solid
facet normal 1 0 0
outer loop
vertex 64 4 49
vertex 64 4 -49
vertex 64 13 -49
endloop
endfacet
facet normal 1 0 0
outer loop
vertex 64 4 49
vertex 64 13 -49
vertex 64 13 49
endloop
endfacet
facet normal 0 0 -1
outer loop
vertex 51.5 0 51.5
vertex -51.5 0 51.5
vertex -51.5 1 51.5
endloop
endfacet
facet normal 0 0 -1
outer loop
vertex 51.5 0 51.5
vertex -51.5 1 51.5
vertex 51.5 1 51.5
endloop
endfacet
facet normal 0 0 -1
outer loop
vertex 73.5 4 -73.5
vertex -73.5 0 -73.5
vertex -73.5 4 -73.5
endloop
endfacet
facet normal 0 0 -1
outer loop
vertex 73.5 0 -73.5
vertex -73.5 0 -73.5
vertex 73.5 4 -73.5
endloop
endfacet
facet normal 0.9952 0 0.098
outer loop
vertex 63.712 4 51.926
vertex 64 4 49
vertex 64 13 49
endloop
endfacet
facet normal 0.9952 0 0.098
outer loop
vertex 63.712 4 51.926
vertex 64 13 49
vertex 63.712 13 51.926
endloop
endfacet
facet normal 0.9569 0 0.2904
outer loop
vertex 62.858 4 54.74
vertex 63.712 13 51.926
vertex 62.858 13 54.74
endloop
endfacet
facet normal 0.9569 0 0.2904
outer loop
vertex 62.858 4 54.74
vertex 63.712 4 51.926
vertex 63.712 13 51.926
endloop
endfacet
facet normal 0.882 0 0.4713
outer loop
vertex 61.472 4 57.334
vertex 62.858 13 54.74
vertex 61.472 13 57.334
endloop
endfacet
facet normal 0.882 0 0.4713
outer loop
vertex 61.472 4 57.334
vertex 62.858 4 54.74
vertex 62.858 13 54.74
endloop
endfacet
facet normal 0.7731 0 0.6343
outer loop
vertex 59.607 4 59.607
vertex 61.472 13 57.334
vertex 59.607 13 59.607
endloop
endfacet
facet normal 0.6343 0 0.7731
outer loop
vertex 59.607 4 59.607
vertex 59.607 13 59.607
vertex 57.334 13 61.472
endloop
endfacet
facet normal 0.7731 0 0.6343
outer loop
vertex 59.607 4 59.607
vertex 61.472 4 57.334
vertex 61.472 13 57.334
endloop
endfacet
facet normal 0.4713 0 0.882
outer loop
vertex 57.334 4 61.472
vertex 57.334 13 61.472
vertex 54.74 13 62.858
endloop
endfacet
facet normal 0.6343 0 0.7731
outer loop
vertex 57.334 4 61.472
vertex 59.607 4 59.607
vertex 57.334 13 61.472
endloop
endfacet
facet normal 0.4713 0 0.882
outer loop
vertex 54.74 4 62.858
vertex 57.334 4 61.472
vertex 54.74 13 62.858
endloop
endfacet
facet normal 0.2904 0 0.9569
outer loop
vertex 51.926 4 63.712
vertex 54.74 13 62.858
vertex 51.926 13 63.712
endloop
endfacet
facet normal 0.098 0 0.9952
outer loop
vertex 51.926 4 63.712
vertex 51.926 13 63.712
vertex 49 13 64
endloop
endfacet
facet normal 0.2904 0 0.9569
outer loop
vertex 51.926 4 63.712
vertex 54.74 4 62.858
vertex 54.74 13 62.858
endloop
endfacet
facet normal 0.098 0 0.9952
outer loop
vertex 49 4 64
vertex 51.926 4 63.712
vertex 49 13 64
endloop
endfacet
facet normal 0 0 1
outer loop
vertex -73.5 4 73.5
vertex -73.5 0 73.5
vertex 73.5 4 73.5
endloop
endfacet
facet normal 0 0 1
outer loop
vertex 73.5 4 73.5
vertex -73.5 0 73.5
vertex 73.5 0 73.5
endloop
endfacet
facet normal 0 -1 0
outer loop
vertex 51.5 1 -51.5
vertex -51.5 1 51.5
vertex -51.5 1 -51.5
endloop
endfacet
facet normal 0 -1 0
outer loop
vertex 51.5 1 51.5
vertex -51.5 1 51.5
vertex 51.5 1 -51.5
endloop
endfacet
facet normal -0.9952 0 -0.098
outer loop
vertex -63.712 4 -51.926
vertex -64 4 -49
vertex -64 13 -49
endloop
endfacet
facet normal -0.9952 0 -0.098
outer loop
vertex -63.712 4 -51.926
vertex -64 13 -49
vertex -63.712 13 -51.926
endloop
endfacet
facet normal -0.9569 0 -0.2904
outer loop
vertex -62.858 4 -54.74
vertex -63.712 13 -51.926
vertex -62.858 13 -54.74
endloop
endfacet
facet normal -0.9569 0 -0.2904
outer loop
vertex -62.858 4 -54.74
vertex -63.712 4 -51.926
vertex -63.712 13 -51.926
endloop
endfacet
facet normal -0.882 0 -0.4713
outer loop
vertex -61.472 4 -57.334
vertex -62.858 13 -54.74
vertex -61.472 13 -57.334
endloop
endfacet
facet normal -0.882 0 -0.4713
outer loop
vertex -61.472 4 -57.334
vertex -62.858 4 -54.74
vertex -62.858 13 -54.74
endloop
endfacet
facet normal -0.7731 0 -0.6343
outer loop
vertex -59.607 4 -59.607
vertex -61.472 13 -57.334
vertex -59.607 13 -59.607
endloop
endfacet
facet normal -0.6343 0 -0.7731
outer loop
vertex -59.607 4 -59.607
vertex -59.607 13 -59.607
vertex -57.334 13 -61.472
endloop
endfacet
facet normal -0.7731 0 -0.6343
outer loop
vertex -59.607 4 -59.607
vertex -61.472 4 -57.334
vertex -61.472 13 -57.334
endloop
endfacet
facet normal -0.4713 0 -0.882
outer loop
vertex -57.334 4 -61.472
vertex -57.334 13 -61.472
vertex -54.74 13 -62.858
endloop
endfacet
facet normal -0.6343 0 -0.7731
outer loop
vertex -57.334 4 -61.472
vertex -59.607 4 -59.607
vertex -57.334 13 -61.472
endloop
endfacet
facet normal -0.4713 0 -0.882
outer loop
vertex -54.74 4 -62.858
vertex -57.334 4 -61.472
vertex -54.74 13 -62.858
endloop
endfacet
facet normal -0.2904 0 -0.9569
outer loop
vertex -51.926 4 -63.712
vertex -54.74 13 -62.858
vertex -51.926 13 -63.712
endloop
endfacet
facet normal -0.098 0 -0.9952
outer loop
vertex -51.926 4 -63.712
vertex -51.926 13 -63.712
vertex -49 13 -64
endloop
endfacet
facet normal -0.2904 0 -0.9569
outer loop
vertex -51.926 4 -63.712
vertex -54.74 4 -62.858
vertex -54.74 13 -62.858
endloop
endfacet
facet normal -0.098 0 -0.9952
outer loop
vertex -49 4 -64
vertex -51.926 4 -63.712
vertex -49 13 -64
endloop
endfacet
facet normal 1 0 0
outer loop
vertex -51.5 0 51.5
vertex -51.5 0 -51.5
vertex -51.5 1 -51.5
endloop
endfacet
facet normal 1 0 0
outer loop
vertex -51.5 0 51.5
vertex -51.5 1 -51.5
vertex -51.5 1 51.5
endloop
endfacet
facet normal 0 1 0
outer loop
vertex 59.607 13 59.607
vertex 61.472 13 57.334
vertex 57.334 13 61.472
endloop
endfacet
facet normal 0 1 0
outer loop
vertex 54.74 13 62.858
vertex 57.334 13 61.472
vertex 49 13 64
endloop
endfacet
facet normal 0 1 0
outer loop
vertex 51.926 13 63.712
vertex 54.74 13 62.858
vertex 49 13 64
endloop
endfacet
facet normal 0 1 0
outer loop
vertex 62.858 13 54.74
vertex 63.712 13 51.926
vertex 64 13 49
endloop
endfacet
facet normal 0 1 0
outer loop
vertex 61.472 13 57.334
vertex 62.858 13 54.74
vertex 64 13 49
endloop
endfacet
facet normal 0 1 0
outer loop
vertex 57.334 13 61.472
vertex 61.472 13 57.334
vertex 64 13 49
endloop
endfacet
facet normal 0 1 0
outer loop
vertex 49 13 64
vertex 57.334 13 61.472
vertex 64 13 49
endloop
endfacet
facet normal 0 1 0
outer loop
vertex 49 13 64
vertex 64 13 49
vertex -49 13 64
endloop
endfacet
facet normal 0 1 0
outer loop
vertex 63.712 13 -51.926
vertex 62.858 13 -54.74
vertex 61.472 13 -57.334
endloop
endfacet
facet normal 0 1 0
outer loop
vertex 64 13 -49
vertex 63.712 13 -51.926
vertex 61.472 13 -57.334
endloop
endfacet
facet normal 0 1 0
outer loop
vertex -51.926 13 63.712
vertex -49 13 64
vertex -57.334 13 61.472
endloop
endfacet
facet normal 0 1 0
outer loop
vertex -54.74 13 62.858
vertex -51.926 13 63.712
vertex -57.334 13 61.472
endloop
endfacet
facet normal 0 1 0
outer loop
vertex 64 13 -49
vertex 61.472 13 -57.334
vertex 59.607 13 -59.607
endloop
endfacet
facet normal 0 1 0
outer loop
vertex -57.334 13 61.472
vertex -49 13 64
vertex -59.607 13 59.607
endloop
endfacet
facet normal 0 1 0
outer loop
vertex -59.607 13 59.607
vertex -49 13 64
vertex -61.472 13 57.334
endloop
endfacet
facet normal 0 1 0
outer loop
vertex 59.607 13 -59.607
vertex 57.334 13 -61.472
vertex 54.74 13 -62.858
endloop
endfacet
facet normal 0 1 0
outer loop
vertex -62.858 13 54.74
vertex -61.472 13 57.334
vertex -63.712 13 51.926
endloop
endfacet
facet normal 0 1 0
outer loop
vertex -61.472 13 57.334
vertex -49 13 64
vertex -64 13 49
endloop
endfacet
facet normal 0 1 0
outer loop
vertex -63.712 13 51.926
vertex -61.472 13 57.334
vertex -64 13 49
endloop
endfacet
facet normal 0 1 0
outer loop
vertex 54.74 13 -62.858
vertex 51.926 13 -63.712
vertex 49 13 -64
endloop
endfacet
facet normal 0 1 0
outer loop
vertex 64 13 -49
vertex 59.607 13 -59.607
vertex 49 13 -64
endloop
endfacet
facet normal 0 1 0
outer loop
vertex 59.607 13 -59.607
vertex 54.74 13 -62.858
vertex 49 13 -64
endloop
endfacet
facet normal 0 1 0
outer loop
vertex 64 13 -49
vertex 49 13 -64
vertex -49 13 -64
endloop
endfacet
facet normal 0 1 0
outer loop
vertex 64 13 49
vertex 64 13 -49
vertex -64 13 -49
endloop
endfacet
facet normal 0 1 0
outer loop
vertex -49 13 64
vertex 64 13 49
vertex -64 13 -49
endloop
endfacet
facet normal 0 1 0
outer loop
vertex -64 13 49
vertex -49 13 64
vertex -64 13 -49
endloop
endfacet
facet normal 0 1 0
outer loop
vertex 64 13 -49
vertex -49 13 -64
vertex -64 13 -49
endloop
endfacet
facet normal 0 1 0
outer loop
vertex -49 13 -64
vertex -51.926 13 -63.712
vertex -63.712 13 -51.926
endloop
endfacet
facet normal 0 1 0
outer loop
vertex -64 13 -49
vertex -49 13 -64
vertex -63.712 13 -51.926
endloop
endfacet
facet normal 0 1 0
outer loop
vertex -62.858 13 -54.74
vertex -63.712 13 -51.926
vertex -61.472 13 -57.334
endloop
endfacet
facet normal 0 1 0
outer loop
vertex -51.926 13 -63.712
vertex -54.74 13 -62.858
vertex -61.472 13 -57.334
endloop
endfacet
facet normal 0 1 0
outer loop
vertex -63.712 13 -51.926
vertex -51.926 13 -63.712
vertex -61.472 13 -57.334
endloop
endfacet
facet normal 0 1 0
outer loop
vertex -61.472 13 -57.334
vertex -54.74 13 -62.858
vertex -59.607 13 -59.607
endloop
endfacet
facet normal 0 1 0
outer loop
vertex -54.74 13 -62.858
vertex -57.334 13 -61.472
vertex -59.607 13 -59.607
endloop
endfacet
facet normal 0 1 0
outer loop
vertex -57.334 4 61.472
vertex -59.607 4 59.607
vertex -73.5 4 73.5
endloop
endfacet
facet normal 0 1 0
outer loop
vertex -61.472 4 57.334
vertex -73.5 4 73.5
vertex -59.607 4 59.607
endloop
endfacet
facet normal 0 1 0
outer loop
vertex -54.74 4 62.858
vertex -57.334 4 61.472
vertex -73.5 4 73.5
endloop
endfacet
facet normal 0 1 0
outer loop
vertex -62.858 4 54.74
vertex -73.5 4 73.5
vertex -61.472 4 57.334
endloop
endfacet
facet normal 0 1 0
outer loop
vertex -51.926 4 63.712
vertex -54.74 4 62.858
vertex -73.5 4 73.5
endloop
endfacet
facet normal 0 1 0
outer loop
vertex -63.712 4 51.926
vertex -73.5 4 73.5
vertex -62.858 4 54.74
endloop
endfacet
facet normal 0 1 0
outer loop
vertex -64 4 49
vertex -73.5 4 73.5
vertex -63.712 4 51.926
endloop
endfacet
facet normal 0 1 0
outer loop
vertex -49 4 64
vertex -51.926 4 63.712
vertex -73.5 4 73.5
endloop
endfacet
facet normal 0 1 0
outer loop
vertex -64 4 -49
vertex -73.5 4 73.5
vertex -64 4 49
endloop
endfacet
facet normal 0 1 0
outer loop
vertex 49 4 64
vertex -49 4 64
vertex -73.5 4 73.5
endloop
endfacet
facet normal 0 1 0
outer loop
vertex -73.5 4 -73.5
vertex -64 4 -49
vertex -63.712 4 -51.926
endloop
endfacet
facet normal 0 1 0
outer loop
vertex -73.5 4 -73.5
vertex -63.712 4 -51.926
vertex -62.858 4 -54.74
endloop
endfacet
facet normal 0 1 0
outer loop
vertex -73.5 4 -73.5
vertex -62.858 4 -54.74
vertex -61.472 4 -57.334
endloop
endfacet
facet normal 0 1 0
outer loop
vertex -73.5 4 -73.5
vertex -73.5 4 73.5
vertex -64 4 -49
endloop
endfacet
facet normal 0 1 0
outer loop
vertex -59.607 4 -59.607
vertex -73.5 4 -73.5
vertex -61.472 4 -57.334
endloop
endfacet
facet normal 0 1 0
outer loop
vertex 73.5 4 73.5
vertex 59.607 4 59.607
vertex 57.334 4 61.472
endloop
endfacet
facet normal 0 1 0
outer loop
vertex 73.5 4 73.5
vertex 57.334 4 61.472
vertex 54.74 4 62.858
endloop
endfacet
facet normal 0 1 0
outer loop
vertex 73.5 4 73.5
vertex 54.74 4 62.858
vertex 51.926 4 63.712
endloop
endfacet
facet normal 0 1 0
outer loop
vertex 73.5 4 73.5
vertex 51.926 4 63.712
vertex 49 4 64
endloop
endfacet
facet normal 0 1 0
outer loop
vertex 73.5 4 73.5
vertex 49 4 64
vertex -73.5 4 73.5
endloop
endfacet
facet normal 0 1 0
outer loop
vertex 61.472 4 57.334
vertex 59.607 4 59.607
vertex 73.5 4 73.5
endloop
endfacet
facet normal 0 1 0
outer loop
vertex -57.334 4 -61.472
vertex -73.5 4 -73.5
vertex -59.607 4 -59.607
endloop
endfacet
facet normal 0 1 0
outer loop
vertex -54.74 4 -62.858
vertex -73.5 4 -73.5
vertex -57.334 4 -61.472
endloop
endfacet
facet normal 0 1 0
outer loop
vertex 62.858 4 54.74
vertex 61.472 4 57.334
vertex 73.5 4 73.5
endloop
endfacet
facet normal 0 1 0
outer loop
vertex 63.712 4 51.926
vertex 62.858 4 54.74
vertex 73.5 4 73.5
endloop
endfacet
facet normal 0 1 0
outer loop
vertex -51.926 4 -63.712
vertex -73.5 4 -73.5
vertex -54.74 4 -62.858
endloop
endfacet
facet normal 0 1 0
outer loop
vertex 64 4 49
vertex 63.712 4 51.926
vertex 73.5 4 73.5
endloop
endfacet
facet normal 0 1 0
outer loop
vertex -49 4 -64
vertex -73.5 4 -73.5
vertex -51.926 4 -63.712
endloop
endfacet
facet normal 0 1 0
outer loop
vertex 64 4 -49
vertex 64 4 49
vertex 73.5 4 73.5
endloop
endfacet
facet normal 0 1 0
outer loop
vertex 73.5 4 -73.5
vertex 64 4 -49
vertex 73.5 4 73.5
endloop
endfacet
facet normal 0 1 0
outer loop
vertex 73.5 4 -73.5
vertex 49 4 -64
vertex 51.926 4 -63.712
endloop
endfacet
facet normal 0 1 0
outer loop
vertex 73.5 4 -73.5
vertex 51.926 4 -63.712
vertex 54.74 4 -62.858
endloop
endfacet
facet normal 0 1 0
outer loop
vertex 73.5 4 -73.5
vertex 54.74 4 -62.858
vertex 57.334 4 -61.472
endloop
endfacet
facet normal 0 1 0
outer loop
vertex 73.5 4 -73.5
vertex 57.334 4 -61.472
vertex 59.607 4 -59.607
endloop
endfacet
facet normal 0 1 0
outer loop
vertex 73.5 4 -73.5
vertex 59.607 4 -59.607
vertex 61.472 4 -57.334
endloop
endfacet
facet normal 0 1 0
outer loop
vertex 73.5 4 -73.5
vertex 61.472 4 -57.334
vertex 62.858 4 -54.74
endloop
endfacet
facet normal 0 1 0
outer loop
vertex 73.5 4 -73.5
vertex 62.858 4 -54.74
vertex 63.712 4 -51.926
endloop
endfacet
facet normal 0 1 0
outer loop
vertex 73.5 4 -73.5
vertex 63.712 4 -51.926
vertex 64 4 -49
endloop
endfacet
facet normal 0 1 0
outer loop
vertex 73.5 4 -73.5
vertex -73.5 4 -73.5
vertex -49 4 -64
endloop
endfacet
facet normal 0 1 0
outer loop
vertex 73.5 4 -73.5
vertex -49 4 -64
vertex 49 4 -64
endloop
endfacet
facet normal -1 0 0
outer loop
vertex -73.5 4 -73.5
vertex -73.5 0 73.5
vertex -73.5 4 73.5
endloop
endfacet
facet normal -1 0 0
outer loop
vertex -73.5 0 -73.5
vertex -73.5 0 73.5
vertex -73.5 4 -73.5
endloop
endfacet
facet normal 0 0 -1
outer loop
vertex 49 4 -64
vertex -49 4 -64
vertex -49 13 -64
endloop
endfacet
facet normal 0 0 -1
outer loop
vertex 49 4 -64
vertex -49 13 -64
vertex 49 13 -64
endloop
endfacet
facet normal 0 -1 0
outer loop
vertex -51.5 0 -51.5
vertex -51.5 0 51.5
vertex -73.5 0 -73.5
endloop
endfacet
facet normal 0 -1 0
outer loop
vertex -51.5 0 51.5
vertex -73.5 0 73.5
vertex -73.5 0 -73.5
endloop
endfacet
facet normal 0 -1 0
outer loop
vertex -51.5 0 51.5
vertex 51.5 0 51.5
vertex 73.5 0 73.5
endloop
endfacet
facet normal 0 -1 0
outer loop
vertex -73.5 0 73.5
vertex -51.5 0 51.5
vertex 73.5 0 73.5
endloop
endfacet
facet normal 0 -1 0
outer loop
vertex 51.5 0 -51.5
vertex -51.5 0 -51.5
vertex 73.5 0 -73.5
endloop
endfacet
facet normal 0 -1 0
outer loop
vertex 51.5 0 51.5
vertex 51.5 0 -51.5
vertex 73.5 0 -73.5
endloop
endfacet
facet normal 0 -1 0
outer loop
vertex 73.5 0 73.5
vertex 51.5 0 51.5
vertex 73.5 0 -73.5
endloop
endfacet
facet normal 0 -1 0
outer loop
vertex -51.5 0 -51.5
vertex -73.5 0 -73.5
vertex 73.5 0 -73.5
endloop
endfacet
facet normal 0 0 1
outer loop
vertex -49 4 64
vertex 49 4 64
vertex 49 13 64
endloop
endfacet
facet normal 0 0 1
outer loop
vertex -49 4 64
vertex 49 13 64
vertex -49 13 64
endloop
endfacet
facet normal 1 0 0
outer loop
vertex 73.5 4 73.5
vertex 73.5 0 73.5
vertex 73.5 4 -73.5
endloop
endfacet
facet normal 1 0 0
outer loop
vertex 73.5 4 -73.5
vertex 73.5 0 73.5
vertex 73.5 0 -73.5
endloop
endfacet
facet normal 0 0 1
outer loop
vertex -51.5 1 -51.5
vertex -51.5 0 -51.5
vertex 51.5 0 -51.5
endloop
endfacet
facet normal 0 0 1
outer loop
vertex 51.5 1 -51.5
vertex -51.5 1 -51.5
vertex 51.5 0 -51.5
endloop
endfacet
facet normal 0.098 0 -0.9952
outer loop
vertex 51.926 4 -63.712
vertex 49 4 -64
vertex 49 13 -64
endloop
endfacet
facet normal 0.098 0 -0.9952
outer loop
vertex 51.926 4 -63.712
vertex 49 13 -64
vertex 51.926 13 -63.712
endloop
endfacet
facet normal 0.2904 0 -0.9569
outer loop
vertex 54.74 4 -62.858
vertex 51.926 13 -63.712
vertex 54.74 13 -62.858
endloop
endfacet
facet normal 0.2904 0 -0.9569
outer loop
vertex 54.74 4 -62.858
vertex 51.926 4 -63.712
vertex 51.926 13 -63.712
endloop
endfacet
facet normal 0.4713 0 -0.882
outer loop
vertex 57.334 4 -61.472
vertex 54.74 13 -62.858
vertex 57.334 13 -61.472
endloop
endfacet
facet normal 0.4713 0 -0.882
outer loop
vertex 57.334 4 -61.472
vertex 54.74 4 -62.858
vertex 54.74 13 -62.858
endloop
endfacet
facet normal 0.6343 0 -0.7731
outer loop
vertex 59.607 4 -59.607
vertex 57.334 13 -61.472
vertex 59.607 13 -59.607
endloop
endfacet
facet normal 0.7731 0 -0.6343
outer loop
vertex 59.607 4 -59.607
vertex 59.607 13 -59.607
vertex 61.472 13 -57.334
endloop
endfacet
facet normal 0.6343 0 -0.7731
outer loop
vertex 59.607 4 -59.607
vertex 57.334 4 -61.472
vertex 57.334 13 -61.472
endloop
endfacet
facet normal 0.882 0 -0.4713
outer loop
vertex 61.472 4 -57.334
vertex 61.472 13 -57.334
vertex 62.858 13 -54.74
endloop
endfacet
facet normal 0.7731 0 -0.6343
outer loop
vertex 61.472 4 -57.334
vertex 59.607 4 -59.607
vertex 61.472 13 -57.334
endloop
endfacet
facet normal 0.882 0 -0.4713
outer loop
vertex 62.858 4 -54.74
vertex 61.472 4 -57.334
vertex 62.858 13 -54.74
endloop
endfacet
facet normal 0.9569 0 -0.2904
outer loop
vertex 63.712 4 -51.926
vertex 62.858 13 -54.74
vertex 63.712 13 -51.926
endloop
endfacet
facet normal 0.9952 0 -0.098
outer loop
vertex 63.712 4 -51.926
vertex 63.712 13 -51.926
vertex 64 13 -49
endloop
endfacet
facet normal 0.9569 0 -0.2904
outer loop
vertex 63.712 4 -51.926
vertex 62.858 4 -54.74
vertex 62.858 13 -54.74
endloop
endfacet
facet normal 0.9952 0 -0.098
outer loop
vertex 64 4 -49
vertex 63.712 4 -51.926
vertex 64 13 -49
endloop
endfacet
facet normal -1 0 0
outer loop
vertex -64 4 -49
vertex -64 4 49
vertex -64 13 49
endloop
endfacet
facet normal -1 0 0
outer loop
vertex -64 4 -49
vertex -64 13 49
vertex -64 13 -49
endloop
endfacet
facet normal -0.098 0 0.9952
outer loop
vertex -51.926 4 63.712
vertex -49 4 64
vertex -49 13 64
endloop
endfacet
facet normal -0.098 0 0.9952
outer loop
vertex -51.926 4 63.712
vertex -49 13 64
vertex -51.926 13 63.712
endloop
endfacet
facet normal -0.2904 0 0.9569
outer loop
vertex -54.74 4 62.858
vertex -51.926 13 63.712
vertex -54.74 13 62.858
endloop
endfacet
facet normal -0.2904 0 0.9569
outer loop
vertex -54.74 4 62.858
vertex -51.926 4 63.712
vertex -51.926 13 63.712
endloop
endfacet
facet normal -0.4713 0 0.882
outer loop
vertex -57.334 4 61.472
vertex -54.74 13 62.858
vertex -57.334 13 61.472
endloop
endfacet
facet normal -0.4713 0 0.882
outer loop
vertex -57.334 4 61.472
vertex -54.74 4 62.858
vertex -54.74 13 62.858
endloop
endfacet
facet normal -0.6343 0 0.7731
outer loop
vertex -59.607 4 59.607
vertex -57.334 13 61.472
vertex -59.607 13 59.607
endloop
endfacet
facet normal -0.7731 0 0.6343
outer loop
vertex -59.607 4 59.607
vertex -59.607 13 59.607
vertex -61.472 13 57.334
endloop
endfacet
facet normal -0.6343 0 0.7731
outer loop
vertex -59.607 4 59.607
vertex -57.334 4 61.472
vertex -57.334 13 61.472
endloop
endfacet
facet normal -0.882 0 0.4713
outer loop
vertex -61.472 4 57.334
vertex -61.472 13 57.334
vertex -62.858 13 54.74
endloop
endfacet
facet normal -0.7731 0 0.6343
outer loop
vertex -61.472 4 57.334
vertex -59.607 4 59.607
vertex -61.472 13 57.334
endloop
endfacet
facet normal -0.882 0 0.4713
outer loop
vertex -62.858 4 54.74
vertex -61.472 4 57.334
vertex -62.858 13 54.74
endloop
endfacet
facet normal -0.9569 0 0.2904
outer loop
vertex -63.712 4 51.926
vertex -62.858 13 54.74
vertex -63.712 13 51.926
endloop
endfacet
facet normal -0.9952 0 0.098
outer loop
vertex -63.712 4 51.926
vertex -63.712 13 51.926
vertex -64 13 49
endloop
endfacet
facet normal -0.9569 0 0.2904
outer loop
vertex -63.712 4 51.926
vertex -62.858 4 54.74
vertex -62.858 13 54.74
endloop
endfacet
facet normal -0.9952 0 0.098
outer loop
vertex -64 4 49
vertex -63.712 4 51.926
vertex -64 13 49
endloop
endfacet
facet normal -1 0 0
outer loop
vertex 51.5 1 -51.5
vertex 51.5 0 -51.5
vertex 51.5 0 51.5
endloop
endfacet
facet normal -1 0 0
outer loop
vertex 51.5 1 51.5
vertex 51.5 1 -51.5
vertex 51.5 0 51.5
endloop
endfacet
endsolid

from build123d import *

# Parameters (mm, degrees)
SKETCH_1_W          = 147
SKETCH_1_H          = 147
EXTRUDE_1_DEPTH     = 4
EXTRUDE_2_DEPTH     = 9
SKETCH_3_W          = 103
SKETCH_3_H          = 103
CUT_EXTRUDE_1_DEPTH = 1


with BuildPart() as part:
    # 草图1 → 凸台-拉伸1 (new body)
    with BuildSketch(Plane(origin=(0, 0, 0), x_dir=(1, 0, 0), z_dir=(0, 1, 0))):
        Rectangle(SKETCH_1_W, SKETCH_1_H)
    extrude(amount=EXTRUDE_1_DEPTH)

    # 草图2 → 凸台-拉伸2 (add)
    with BuildSketch(Plane(origin=(0, 4, 0), x_dir=(1, 0, 0), z_dir=(0, 1, 0))):
        with BuildLine():
            Line((49, -64), (-49, -64))
            ThreePointArc((-49, -64), (-59.606601718, -59.606601718), (-64, -49))
            Line((-64, -49), (-64, 49))
            ThreePointArc((-64, 49), (-59.606601718, 59.606601718), (-49, 64))
            Line((-49, 64), (49, 64))
            ThreePointArc((49, 64), (59.606601718, 59.606601718), (64, 49))
            Line((64, 49), (64, -49))
            ThreePointArc((64, -49), (59.606601718, -59.606601718), (49, -64))
        make_face()
    extrude(amount=EXTRUDE_2_DEPTH)

    # 草图3 → 切除-拉伸1 (cut)
    with BuildSketch(Plane.XZ):
        Rectangle(SKETCH_3_W, SKETCH_3_H)
    extrude(amount=-CUT_EXTRUDE_1_DEPTH, mode=Mode.SUBTRACT)


solid = part.part
